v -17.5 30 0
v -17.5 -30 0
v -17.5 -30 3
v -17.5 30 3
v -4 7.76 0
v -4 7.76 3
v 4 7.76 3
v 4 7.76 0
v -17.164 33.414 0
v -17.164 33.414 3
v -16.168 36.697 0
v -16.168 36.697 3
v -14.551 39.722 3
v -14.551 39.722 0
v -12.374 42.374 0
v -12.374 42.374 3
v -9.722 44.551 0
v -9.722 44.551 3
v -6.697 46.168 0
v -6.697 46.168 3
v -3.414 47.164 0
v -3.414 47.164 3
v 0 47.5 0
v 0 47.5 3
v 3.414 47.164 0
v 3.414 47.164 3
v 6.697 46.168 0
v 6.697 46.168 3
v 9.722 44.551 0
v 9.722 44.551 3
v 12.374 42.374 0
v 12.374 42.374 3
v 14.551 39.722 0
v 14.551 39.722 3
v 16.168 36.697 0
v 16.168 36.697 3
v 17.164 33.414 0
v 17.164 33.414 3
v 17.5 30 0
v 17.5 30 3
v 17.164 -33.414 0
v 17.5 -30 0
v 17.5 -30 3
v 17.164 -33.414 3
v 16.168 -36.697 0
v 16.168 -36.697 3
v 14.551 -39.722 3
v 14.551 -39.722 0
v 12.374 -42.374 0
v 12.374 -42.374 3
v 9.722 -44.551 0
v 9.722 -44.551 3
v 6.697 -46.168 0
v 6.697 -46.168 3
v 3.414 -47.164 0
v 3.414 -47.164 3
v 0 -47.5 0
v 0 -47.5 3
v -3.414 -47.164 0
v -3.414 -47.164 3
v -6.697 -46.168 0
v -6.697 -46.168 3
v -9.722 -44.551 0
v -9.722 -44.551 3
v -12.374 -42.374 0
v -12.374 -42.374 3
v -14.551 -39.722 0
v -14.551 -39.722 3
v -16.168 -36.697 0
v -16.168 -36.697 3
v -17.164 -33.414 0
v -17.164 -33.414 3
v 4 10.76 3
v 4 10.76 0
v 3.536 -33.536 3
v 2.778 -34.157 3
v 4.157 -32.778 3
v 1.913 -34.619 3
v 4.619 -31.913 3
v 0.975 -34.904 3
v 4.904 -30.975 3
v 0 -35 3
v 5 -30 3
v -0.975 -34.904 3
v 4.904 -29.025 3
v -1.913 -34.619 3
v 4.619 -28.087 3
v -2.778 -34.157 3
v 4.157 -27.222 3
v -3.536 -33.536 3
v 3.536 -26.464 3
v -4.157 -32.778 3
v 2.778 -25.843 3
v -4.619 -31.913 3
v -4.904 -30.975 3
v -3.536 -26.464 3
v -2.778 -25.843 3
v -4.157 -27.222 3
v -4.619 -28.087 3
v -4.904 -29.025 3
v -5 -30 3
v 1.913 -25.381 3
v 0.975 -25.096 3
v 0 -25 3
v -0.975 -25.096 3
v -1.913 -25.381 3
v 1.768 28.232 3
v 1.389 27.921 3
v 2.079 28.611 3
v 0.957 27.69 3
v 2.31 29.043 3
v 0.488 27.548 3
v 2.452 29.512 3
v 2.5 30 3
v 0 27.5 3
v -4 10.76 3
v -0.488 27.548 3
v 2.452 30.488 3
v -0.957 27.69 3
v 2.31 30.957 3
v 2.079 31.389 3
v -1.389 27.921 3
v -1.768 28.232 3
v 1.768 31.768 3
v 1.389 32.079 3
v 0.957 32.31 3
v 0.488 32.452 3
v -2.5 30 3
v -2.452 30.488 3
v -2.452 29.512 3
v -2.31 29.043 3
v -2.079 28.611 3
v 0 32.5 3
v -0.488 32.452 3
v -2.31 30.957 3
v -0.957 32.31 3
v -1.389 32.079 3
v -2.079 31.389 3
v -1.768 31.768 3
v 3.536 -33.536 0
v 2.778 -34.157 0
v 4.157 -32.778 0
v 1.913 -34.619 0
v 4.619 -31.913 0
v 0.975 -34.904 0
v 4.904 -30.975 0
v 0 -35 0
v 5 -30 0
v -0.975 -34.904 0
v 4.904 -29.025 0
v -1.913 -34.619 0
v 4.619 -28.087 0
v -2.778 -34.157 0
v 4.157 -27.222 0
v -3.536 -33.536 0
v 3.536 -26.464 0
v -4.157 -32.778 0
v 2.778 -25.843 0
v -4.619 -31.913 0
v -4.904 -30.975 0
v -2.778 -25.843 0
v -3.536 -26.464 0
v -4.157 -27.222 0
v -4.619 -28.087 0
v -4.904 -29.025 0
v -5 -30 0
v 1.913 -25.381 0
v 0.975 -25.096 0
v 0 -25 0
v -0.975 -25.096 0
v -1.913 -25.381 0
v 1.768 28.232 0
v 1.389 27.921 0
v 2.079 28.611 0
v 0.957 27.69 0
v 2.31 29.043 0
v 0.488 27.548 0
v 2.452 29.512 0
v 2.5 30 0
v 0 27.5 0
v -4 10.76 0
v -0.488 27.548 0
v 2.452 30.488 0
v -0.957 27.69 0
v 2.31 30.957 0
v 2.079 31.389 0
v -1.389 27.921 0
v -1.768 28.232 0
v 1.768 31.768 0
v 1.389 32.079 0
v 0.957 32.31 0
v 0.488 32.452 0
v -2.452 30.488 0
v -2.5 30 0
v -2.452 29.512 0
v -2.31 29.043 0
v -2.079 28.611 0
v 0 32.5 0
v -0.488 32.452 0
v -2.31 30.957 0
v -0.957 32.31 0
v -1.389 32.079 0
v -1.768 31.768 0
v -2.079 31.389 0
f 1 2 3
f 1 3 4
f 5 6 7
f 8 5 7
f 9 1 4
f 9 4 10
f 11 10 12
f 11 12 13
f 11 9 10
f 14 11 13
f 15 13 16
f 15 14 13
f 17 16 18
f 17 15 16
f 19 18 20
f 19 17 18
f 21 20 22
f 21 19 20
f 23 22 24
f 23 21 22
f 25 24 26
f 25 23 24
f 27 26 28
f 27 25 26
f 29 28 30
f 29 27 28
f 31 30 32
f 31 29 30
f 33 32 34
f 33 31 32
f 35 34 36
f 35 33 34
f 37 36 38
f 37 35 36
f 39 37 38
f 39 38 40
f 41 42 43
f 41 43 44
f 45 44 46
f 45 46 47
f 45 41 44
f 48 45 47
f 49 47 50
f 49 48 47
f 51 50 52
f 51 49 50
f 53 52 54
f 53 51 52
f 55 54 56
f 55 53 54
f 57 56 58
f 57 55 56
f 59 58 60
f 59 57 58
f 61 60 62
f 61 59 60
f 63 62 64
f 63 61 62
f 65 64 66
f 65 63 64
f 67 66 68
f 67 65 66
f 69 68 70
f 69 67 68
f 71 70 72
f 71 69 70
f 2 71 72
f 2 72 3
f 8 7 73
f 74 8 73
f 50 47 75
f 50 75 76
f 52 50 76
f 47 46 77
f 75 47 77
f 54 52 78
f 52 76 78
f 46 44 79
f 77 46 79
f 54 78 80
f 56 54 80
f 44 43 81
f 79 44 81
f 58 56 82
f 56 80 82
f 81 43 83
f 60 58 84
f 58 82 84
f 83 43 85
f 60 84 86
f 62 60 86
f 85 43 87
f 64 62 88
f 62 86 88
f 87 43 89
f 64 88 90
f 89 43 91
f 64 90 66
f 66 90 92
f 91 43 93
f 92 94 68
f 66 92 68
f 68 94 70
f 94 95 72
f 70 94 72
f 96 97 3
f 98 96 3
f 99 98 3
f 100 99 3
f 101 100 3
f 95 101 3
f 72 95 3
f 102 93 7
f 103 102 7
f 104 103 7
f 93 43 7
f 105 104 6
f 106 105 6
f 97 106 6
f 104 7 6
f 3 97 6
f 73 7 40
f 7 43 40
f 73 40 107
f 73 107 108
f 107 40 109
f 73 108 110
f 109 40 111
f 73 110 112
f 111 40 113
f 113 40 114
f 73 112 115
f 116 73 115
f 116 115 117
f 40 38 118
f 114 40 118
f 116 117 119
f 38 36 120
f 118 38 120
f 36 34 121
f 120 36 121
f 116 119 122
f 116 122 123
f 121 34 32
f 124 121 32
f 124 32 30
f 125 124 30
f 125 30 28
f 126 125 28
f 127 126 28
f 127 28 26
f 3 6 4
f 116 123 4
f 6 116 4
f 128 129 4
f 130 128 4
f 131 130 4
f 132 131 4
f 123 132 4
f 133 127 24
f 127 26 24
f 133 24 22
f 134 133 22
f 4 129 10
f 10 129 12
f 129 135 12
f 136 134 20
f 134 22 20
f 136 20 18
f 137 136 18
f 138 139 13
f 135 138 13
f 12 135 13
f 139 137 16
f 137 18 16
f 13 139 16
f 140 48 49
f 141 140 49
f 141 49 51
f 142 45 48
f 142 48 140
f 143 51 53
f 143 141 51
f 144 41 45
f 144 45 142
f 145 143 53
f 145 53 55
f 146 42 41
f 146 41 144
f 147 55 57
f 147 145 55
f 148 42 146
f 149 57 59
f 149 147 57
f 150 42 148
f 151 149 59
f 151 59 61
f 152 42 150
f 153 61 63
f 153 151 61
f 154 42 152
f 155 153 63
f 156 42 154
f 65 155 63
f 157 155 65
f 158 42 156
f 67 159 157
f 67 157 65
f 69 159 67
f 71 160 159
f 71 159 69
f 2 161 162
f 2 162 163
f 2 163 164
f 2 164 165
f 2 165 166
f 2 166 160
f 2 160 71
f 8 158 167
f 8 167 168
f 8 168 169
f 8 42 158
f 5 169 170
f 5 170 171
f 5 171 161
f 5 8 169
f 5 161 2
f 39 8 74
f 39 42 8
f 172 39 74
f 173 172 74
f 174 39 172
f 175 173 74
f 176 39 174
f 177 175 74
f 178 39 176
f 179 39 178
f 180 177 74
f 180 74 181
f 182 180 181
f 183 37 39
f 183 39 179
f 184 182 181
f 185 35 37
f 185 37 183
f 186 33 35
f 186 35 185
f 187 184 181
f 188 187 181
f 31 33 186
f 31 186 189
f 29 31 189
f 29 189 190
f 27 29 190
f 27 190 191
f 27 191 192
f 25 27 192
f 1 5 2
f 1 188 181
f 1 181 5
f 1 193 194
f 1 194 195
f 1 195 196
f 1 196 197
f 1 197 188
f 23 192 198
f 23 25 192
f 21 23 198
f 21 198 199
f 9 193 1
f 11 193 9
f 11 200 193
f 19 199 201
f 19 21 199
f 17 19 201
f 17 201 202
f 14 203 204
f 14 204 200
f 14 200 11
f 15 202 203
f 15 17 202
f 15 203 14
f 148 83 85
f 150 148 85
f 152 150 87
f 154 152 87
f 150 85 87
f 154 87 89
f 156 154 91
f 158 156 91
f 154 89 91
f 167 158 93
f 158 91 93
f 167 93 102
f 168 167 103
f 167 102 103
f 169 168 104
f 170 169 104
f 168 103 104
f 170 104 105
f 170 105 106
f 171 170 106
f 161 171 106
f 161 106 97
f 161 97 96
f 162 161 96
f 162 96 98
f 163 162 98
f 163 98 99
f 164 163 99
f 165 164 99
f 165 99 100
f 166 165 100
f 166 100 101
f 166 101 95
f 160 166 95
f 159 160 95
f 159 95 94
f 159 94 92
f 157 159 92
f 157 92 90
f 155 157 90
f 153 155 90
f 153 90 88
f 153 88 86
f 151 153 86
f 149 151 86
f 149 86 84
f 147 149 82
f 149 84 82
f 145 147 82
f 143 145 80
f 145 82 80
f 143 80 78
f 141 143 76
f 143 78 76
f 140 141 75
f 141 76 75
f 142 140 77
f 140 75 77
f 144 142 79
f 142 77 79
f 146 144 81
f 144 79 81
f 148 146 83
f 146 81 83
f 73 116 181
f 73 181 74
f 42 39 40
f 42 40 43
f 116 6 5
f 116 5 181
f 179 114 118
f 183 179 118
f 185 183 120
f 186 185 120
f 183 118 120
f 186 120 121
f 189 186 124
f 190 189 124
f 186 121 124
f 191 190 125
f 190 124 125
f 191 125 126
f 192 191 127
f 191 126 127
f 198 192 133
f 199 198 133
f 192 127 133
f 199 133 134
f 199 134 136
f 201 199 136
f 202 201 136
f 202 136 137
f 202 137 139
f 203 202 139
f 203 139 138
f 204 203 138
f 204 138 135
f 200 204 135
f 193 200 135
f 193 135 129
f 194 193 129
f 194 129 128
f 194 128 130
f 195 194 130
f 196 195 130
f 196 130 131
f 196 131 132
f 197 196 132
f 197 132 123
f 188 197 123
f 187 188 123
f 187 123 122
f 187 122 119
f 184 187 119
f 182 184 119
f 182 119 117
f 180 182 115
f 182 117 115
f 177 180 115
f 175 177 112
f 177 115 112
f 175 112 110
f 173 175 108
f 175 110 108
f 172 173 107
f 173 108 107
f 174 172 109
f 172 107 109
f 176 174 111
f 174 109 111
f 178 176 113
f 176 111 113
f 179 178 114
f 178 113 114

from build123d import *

# Parameters (mm, degrees)
SALIENTE_EXTRUIR1_DEPTH           = 3
CORTAR_EXTRUIR1_REACH             = 52.71
CROQUIS3_R                        = 2.5
CROQUIS3_R_2                      = 5
CORTAR_EXTRUIR2_REACH             = 52.71
CROQUIS4_W                        = 8
CROQUIS4_H                        = 3
CORTAR_EXTRUIR2_DIRECTION_2_DEPTH = 51.709959574


with BuildPart() as part:
    # Croquis1 → Saliente-Extruir1 (new body)
    with BuildSketch(Plane.XY):
        with BuildLine():
            Line((-17.5, -30), (-17.5, 30))
            ThreePointArc((-17.5, 30), (0, 47.5), (17.5, 30))
            Line((17.5, 30), (17.5, -30))
            ThreePointArc((17.5, -30), (0, -47.5), (-17.5, -30))
        make_face()
    extrude(amount=SALIENTE_EXTRUIR1_DEPTH)

    # Croquis3 → Cortar-Extruir1 (cut, up to next)
    with BuildSketch(Plane.XY.offset(3), mode=Mode.PRIVATE) as cortar_extruir1_sk1:
        with Locations((0, 30)):
            Circle(CROQUIS3_R)
    cortar_extruir1_tool1 = extrude(cortar_extruir1_sk1.sketch, amount=-CORTAR_EXTRUIR1_REACH, mode=Mode.PRIVATE) & part.part
    # Croquis3 → Cortar-Extruir1 (cut, up to next)
    with BuildSketch(Plane.XY.offset(3), mode=Mode.PRIVATE) as cortar_extruir1_sk2:
        with Locations((0, -30)):
            Circle(CROQUIS3_R_2)
    cortar_extruir1_tool2 = extrude(cortar_extruir1_sk2.sketch, amount=-CORTAR_EXTRUIR1_REACH, mode=Mode.PRIVATE) & part.part
    add(cortar_extruir1_tool1.solids().sort_by_distance((0, 30, 3))[0], mode=Mode.SUBTRACT)
    add(cortar_extruir1_tool2.solids().sort_by_distance((0, -30, 3))[0], mode=Mode.SUBTRACT)

    # Croquis4 → Cortar-Extruir2 (cut, up to next)
    with BuildSketch(Plane.XY.offset(3), mode=Mode.PRIVATE) as cortar_extruir2_sk1:
        with Locations((0, 9.26)):
            Rectangle(CROQUIS4_W, CROQUIS4_H)
    cortar_extruir2_tool1 = extrude(cortar_extruir2_sk1.sketch, amount=-CORTAR_EXTRUIR2_REACH, mode=Mode.PRIVATE) & part.part
    add(cortar_extruir2_tool1.solids().sort_by_distance((0, 9.26, 3))[0], mode=Mode.SUBTRACT)

    # Croquis4 → Cortar-Extruir2 direction 2 (cut)
    with BuildSketch(Plane.XY.offset(3)):
        with Locations((0, 9.26)):
            Rectangle(CROQUIS4_W, CROQUIS4_H)
    extrude(amount=CORTAR_EXTRUIR2_DIRECTION_2_DEPTH, mode=Mode.SUBTRACT)


solid = part.part
